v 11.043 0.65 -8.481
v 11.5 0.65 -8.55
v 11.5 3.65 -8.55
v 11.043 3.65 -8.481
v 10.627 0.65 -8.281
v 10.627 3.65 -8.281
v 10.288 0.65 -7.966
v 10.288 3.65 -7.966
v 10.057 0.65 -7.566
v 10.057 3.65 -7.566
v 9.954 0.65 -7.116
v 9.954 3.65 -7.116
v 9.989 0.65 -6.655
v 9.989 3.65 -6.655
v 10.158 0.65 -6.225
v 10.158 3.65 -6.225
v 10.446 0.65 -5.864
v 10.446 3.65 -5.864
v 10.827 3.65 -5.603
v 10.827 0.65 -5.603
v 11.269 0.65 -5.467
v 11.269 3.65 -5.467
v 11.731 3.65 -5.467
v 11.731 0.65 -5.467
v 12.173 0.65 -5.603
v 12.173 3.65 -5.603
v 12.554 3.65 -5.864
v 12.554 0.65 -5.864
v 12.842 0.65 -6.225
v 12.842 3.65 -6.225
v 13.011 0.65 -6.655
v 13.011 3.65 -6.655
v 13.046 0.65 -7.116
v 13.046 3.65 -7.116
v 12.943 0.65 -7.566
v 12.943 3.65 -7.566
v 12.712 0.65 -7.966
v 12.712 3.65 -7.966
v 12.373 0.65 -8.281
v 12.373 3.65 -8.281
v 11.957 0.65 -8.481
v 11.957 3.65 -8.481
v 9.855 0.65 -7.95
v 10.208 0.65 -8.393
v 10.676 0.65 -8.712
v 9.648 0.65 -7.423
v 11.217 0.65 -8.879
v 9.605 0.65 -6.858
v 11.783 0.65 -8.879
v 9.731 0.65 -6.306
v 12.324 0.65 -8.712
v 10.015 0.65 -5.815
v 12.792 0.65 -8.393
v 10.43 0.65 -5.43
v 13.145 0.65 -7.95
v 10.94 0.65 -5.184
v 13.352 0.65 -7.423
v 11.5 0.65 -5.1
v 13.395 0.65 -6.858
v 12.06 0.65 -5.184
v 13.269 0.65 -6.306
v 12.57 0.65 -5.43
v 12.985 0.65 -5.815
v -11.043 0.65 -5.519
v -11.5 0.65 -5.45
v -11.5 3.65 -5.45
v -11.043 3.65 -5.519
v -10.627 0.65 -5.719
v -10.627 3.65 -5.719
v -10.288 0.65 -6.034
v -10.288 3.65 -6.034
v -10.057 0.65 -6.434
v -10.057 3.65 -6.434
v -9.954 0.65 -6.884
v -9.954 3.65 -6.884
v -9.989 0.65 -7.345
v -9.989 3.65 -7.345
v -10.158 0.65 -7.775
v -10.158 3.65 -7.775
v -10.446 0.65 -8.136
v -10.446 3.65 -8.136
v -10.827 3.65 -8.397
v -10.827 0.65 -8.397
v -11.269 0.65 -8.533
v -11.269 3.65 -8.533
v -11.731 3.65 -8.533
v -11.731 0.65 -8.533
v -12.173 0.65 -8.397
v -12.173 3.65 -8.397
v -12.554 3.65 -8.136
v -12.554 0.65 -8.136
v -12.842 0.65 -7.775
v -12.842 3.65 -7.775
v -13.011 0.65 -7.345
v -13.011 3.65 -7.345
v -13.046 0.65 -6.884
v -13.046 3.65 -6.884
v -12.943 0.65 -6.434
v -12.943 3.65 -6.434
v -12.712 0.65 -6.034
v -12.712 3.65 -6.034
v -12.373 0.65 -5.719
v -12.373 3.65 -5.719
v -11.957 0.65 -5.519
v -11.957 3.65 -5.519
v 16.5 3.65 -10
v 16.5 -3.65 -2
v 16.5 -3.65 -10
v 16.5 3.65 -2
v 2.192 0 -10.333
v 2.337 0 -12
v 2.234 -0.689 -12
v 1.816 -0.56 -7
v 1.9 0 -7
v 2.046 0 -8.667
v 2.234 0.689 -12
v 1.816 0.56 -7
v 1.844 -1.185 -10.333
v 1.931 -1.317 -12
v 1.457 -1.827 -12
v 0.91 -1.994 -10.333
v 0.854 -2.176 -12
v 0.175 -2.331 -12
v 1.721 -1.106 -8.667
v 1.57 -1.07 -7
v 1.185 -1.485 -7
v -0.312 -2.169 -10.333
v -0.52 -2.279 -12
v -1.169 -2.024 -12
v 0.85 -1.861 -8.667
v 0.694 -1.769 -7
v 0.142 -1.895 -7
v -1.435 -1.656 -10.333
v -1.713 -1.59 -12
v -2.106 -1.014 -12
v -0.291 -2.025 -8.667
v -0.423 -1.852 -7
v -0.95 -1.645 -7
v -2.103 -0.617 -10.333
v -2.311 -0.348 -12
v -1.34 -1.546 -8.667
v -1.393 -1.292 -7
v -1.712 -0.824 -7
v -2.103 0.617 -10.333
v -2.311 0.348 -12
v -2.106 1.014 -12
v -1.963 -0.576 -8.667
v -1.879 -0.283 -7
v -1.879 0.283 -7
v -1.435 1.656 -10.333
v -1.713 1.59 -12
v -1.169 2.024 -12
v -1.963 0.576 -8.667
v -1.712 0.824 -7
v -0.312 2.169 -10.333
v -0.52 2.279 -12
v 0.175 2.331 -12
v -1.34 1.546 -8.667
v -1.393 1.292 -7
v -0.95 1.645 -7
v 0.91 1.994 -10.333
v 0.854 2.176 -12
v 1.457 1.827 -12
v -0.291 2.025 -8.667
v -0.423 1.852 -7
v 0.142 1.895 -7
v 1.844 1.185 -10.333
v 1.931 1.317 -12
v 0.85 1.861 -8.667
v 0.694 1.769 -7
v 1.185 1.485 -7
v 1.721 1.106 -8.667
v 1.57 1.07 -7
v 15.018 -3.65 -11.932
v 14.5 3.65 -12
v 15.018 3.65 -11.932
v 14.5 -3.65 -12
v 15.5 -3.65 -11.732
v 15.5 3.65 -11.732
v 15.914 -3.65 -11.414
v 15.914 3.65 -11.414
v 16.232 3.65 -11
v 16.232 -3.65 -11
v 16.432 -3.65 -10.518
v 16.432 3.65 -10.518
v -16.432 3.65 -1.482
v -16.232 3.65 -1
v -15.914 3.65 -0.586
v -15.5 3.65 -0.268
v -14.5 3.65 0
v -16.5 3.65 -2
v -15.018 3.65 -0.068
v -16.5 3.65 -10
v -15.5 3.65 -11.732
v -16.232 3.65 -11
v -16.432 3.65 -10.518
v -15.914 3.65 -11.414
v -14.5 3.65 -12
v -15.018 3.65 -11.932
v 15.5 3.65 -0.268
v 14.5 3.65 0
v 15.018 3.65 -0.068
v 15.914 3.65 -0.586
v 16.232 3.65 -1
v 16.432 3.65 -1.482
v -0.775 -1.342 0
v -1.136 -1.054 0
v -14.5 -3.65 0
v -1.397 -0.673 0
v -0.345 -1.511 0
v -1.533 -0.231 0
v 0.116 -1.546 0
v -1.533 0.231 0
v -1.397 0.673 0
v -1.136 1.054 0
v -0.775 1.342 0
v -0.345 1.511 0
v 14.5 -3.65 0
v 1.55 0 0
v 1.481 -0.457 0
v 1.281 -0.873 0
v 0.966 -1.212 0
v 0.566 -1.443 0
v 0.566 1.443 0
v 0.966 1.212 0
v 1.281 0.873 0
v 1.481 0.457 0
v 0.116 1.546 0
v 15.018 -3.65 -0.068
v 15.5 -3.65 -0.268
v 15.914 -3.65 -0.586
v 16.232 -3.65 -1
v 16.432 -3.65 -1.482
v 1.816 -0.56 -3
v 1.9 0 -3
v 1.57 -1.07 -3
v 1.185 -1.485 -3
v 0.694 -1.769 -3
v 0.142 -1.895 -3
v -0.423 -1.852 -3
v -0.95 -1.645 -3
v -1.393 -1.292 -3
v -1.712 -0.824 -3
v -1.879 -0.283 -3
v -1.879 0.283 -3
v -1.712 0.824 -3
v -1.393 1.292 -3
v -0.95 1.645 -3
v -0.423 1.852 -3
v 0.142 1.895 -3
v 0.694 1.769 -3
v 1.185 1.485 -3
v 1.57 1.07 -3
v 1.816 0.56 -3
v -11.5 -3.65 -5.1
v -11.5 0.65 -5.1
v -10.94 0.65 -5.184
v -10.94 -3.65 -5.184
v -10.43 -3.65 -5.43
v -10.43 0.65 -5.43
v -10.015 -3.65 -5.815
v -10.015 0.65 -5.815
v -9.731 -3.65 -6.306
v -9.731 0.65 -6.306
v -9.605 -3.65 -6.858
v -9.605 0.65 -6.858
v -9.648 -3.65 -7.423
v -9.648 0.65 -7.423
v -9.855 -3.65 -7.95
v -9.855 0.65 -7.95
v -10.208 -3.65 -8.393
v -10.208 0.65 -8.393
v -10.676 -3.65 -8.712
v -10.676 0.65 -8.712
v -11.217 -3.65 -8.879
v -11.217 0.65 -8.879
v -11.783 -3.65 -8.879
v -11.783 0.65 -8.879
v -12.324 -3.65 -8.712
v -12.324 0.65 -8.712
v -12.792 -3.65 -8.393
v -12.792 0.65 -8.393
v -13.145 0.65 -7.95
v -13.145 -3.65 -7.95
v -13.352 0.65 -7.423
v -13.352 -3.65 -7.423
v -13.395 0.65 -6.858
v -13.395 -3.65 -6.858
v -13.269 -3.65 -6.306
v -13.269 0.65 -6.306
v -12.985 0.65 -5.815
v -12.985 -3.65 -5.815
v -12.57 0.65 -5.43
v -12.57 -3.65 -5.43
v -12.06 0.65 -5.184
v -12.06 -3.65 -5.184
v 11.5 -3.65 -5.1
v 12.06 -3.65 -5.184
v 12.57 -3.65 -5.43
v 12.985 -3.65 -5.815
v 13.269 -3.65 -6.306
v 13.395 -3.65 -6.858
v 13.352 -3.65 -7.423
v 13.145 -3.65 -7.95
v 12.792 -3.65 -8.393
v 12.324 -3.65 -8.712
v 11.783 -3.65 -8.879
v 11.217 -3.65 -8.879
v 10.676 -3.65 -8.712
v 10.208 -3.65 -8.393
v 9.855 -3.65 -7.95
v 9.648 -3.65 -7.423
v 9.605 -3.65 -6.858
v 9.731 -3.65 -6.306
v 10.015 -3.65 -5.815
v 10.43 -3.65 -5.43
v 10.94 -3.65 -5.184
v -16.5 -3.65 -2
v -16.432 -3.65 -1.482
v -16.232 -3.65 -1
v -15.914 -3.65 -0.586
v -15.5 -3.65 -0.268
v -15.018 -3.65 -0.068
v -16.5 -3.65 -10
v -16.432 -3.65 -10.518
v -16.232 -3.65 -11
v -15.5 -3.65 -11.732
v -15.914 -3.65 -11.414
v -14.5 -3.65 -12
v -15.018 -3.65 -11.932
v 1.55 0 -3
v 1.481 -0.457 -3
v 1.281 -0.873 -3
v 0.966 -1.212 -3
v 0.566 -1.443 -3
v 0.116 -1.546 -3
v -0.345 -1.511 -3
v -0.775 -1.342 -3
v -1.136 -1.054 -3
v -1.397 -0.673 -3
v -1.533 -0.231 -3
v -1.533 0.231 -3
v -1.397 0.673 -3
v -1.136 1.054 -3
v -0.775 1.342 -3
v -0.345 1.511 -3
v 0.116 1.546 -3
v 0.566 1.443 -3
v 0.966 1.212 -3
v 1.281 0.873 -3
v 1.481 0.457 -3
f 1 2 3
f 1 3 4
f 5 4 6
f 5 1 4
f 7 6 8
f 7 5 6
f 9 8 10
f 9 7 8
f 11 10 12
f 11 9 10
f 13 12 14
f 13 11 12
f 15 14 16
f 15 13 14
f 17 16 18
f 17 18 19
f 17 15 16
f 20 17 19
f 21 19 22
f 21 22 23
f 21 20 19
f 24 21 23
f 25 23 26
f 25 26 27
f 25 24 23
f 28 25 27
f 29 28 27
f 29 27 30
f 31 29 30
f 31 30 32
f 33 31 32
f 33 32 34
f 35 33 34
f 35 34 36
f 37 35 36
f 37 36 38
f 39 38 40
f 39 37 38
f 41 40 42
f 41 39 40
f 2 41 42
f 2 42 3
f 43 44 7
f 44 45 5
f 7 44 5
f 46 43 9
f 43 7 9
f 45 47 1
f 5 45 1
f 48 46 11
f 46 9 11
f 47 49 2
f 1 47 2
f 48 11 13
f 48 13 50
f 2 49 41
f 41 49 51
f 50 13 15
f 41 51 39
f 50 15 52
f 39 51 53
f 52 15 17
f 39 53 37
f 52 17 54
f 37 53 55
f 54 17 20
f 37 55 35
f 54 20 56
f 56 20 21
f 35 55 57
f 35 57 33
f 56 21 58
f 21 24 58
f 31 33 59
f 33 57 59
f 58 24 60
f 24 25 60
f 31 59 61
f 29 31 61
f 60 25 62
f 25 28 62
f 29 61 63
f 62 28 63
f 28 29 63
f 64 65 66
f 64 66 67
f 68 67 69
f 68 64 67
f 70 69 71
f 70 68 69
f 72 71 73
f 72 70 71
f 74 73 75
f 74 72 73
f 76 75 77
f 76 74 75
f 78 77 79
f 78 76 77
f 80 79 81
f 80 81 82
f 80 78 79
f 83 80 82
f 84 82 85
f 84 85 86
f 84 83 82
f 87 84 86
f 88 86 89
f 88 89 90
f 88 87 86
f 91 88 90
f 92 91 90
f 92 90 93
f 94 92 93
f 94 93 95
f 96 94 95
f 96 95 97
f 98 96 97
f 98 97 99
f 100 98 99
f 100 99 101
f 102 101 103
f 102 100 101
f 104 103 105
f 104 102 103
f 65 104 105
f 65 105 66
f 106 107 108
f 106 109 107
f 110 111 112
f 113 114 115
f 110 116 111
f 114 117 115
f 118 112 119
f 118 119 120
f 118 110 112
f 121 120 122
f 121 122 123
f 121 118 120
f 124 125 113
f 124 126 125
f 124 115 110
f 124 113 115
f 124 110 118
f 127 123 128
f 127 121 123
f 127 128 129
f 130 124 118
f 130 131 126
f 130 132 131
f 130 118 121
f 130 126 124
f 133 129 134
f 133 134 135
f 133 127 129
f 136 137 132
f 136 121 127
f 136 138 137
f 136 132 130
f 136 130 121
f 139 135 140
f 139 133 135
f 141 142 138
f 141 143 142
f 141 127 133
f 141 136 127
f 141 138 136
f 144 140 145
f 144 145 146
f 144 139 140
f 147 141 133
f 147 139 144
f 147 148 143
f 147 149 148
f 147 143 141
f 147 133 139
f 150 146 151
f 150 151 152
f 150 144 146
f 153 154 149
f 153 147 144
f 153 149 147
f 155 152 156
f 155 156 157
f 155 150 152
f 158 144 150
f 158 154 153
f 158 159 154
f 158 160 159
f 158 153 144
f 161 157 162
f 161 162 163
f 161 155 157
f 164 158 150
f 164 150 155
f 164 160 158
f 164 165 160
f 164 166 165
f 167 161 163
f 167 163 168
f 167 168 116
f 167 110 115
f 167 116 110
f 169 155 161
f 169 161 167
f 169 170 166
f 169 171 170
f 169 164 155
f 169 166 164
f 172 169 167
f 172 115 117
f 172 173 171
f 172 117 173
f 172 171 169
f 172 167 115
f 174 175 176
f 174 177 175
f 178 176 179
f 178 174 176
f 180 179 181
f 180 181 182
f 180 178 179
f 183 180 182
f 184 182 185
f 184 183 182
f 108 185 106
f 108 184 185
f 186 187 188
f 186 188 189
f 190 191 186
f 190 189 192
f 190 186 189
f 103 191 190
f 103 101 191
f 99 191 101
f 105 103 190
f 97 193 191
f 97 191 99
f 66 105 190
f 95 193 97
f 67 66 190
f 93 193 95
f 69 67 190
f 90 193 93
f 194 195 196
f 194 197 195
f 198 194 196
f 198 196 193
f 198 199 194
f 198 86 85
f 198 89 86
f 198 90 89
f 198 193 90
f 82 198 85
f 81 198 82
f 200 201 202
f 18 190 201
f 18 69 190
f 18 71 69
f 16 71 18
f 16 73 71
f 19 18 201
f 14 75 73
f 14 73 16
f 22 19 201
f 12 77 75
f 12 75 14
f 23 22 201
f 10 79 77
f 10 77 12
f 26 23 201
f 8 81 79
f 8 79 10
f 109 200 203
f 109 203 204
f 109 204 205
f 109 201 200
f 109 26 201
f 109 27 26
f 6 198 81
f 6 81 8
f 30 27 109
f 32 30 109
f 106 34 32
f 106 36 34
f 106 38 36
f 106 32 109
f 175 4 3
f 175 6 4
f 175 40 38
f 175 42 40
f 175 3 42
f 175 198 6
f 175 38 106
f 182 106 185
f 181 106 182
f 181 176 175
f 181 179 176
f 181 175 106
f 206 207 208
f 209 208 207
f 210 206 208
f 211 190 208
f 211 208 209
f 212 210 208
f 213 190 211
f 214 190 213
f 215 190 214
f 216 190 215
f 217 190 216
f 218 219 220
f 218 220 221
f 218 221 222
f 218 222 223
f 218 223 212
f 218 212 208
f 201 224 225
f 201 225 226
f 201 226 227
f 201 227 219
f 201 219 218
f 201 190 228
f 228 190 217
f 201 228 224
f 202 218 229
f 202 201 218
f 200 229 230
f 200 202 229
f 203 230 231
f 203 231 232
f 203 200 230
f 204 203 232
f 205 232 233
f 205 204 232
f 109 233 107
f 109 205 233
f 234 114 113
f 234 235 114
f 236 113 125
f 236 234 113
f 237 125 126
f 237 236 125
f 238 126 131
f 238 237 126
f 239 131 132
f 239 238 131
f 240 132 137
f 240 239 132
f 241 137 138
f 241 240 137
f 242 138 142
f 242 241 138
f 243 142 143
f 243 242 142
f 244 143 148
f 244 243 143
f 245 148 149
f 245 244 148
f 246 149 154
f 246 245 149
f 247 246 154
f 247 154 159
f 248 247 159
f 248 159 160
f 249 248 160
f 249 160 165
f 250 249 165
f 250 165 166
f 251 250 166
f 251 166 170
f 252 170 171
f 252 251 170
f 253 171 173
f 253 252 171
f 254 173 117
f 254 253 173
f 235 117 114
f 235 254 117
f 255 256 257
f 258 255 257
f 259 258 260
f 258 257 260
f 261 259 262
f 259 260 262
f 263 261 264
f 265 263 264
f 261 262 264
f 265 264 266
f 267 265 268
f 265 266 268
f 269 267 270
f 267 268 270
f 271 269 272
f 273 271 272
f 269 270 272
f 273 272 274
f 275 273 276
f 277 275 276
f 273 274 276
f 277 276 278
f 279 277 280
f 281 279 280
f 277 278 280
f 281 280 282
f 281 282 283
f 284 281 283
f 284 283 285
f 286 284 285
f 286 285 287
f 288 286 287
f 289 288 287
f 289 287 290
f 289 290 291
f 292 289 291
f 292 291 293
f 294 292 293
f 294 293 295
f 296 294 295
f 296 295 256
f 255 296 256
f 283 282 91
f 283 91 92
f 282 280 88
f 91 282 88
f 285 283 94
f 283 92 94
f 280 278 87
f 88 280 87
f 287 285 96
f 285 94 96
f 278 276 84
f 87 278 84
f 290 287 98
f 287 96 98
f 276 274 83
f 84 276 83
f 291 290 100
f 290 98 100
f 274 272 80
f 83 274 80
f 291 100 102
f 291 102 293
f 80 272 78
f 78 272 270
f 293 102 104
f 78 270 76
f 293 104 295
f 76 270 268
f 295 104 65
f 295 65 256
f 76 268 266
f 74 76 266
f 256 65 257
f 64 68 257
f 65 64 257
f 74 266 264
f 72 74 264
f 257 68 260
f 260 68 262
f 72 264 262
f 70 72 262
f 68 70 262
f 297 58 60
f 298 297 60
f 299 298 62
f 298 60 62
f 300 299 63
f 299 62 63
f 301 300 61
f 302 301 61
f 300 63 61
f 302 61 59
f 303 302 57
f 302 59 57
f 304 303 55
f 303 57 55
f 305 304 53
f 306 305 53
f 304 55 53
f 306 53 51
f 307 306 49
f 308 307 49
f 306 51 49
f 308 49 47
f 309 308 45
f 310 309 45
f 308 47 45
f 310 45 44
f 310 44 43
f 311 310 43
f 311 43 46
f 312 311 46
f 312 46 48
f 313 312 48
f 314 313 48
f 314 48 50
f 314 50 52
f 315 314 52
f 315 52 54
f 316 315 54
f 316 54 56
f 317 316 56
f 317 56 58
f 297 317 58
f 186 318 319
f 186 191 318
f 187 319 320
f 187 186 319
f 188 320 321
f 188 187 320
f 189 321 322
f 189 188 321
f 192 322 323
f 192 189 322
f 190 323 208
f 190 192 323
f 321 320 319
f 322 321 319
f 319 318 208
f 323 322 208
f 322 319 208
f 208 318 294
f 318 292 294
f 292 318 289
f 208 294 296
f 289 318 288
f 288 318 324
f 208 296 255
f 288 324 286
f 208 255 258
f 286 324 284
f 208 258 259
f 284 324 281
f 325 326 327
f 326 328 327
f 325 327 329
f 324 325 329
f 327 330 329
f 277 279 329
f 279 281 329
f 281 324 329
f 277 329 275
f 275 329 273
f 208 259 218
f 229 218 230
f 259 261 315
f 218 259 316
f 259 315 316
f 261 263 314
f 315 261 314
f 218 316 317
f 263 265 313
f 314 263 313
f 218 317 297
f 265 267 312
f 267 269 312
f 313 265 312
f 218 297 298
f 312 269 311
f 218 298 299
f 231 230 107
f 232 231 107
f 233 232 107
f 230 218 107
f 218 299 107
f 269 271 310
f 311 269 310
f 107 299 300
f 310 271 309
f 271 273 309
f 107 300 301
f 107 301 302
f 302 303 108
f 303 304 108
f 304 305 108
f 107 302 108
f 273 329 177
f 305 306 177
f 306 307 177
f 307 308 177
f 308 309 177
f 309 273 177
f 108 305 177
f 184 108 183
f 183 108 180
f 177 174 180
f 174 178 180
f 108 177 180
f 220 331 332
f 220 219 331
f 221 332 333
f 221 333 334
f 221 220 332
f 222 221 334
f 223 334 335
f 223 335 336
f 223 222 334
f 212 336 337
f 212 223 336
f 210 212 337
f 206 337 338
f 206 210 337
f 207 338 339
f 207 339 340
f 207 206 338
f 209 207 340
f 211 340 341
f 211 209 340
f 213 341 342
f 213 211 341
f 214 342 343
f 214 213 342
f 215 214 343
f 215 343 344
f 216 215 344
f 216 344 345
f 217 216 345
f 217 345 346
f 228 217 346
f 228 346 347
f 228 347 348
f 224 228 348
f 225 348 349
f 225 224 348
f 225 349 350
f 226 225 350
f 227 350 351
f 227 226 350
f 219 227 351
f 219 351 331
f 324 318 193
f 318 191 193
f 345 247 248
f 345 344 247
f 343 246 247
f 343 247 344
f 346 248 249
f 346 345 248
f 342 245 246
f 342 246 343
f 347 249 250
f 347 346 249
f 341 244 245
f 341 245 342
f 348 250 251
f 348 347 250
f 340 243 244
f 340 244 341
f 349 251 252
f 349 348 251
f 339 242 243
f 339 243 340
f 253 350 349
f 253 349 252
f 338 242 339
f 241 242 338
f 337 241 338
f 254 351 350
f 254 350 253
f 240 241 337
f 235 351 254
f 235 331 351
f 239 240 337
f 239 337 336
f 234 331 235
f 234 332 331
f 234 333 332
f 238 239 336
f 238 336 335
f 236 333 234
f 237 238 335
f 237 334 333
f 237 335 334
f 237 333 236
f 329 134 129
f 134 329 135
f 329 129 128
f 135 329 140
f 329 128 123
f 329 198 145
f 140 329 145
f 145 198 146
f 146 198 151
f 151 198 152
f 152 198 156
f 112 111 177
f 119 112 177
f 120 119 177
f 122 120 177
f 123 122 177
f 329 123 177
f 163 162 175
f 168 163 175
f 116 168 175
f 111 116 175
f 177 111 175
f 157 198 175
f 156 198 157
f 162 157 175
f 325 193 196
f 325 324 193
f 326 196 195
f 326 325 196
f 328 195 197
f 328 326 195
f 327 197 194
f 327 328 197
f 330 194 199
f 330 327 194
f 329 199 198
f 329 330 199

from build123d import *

# Parameters (mm, degrees)
ESQUISSE1_W             = 33
ESQUISSE1_H             = 12
ESQUISSE1_R             = 1.55
BOSS_EXTRU_1_DEPTH      = 3.65
ENL_V_START             = -3
ESQUISSE5_R             = 1.9
ENL_V_MAT_EXTRU_3_DEPTH = 19.668871683
CONG_1_R                = 2


with BuildPart() as part:
    # Esquisse1 → Boss.-Extru.1 (new, symmetric)
    with BuildSketch(Plane(origin=(0, 0, 0), x_dir=(1, 0, 0), z_dir=(0, 1, 0))):
        with Locations((0, 6)):
            Rectangle(ESQUISSE1_W, ESQUISSE1_H)
        with Locations(Location((-11.5, 7, 0), (0, 0, 270))):
            Circle(ESQUISSE1_R, mode=Mode.SUBTRACT)
        with Locations(Location((11.5, 7, 0), (0, 0, 90))):
            Circle(ESQUISSE1_R, mode=Mode.SUBTRACT)
    extrude(amount=BOSS_EXTRU_1_DEPTH, both=True)

    # Esquisse4 → Enlèvement de matière-Révolution1 (revolve, cut)
    with BuildSketch(Plane(origin=(0, 0, 0), x_dir=(0, 0, -1), z_dir=(1, 0, 0)), mode=Mode.PRIVATE) as enl_vement_de_mati_re_r_volution1_sk:
        Polygon((0, 0), (12, 0), (12, 2.337443318), (7, 1.9), (3, 1.9), (3, 1.55), (0, 1.55), align=None)
    revolve(enl_vement_de_mati_re_r_volution1_sk.sketch.rotate(Axis((0, 0, 12), (0, 0, -1)), 90), axis=Axis((0, 0, 12), (0, 0, -1)), mode=Mode.SUBTRACT)

    # Esquisse5 → Enlèv. mat.-Extru.3 (cut, through all)
    with BuildSketch(Plane(origin=(0, 3.65, 0), x_dir=(1, 0, 0), z_dir=(0, 1, 0)).offset(ENL_V_START)):
        with Locations(Location((-11.5, 7, 0), (0, 0, 270))):
            Circle(ESQUISSE5_R)
        with Locations(Location((11.5, 7, 0), (0, 0, 270))):
            Circle(ESQUISSE5_R)
    extrude(amount=-ENL_V_MAT_EXTRU_3_DEPTH, mode=Mode.SUBTRACT)

    # Congé1
    cong_1_edges = [part.edges().sort_by_distance(p)[0] for p in [
        (-16.5, 0, -12),
        (16.5, 0, -12),
        (16.5, 0, 0),
        (-16.5, 0, 0),
    ]]
    fillet(cong_1_edges, radius=CONG_1_R)


solid = part.part
